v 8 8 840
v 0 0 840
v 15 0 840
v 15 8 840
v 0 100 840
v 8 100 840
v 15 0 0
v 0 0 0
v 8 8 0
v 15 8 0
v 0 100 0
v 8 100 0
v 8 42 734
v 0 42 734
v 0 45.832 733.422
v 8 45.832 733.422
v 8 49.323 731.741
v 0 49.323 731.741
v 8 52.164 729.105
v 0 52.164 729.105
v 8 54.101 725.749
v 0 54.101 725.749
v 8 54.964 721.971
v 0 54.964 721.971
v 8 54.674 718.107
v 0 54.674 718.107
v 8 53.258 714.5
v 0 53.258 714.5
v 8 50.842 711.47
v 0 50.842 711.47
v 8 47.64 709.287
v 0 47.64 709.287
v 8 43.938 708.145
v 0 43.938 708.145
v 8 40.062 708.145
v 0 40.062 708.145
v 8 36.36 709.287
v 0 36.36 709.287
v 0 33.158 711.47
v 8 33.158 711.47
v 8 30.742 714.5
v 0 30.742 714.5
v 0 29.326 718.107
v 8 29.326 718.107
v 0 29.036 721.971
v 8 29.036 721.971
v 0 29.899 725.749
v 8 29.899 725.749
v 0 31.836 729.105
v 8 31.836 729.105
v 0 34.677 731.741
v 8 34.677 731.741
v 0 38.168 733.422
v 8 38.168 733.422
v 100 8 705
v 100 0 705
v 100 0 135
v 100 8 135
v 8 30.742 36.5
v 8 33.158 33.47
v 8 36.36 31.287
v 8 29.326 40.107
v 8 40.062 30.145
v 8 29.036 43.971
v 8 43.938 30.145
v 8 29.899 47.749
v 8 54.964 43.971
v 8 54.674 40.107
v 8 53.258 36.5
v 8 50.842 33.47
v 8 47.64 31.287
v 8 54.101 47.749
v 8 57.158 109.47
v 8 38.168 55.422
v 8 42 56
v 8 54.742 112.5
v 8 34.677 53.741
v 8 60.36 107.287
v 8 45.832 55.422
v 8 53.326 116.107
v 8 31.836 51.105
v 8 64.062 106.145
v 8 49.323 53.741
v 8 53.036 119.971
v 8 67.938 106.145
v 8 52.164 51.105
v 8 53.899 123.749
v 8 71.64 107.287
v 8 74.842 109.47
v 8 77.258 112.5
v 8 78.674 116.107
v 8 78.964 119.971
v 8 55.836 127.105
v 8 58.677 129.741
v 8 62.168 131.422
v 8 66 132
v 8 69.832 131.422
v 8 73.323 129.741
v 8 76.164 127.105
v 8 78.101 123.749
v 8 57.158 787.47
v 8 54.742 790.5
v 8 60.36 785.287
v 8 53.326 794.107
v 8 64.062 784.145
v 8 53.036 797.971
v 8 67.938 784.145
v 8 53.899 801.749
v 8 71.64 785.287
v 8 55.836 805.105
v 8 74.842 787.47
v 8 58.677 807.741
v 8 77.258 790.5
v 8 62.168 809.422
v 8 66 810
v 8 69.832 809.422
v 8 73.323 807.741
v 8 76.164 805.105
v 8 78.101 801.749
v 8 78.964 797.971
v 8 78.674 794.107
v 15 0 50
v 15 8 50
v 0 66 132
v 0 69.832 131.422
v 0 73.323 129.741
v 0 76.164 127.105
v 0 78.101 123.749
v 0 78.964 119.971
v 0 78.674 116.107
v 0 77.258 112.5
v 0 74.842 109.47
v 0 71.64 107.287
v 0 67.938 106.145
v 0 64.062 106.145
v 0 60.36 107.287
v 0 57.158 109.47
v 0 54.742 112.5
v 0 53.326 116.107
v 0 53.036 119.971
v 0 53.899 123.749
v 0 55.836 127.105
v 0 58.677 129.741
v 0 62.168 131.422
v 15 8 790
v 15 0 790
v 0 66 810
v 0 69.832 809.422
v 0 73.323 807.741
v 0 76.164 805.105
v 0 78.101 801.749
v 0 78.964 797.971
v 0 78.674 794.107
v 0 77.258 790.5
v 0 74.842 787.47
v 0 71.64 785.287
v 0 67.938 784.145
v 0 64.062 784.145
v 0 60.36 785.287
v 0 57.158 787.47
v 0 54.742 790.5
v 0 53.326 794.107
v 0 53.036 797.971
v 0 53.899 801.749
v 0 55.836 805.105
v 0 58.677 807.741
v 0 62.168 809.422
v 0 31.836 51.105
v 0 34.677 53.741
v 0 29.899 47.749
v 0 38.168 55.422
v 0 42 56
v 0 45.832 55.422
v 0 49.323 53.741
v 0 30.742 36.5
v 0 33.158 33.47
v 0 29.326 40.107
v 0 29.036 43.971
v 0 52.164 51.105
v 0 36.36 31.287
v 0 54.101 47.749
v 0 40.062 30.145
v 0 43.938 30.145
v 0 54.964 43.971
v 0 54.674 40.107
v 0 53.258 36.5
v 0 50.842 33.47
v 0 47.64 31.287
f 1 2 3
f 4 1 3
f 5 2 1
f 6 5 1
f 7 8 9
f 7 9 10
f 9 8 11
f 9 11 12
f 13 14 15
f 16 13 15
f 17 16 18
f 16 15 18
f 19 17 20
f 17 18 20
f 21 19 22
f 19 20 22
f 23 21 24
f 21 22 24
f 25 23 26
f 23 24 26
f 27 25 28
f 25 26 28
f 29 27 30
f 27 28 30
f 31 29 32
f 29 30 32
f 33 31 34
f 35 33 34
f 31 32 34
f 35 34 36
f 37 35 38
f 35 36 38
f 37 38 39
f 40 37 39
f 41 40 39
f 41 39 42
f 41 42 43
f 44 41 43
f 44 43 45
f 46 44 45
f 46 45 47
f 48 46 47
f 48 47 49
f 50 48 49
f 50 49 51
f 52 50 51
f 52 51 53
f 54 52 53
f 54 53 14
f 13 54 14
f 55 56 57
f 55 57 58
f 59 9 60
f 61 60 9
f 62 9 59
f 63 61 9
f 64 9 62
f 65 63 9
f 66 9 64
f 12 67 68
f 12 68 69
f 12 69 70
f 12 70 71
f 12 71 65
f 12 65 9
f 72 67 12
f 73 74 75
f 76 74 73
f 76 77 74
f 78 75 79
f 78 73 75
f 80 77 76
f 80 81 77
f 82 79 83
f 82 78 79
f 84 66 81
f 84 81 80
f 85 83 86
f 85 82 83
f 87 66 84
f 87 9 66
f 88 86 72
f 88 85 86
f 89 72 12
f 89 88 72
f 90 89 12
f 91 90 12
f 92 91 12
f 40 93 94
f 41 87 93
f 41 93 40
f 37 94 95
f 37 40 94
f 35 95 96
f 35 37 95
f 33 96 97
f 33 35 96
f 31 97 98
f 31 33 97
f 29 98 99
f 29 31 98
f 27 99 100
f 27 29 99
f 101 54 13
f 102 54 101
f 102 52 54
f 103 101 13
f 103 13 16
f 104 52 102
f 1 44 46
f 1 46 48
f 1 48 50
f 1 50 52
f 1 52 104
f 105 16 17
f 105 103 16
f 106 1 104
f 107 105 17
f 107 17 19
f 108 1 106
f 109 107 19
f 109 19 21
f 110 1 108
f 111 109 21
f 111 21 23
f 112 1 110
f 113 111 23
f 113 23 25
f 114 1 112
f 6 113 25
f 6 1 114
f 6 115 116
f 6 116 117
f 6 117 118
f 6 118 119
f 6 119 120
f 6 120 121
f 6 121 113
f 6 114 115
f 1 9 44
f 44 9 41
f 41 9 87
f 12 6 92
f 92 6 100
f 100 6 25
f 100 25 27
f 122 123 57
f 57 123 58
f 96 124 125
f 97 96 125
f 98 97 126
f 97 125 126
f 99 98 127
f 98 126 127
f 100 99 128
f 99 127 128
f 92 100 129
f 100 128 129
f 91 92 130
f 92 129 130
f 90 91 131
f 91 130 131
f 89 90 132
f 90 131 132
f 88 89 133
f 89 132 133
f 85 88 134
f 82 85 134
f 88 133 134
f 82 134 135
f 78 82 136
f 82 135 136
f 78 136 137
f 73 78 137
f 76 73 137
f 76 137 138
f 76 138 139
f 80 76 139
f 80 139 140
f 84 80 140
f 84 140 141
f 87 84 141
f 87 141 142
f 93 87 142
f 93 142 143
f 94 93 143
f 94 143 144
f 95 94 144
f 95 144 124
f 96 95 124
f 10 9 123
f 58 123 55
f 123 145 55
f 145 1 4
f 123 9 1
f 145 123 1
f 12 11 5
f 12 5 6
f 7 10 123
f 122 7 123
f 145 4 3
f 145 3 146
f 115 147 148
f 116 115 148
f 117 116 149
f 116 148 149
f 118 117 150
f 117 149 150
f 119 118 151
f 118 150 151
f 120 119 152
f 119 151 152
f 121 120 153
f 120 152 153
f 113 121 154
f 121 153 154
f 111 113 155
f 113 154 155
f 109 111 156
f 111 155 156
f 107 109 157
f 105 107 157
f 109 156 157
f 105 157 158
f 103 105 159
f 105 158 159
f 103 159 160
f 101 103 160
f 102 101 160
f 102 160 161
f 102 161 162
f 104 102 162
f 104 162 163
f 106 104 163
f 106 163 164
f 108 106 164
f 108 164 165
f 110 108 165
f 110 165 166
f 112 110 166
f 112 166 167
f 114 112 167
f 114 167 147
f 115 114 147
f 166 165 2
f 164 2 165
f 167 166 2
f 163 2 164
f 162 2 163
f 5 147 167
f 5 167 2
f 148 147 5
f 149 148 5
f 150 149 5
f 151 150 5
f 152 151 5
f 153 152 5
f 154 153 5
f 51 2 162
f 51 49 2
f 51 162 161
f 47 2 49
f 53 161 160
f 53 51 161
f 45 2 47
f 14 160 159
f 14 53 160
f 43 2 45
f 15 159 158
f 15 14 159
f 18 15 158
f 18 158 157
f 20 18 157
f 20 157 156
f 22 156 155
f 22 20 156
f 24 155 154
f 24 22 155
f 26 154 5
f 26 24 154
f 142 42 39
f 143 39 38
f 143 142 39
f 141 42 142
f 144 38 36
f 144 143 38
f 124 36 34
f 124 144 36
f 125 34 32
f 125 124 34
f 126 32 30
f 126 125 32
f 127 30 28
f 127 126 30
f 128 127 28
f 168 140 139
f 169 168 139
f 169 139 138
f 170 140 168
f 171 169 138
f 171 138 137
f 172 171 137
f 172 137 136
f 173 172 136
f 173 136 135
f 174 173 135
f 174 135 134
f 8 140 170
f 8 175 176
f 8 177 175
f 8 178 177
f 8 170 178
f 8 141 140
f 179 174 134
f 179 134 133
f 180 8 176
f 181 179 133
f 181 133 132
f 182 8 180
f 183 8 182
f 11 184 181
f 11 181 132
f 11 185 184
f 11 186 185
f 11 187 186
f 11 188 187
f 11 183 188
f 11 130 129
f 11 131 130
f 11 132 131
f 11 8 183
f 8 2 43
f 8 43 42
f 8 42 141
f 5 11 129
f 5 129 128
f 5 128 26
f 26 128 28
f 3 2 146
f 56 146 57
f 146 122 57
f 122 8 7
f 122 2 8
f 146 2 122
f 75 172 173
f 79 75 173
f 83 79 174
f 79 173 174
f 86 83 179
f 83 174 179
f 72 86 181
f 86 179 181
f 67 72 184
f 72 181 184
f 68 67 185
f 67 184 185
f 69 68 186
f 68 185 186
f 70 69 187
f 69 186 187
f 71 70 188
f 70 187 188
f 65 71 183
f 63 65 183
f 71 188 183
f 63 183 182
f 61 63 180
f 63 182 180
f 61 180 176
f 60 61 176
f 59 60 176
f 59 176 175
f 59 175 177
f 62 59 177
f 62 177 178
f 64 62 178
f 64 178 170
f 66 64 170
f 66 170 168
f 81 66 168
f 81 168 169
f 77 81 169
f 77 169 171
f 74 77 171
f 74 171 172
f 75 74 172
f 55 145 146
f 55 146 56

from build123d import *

# Parameters (mm, degrees)
SKETCH_1_W          = 100
SKETCH_1_H          = 100
EXTRUDE_1_DEPTH     = 840
SKETCH_2_W          = 92
SKETCH_2_H          = 92
CUT_EXTRUDE_1_DEPTH = 852.821577562
SKETCH_3_R          = 13
CUT_EXTRUDE_2_DEPTH = 852.821577562
CUT_EXTRUDE_3_DEPTH = 851.919502656


with BuildPart() as part:
    # 草图1 → 凸台-拉伸1 (new body)
    with BuildSketch(Plane.XY):
        with Locations((50, 50)):
            Rectangle(SKETCH_1_W, SKETCH_1_H)
    extrude(amount=EXTRUDE_1_DEPTH)

    # 草图2 → 切除-拉伸1 (cut, through all)
    with BuildSketch(Plane.XY.offset(840)):
        with Locations((54, 54)):
            Rectangle(SKETCH_2_W, SKETCH_2_H)
    extrude(amount=-CUT_EXTRUDE_1_DEPTH, mode=Mode.SUBTRACT)

    # 草图3 → 切除-拉伸2 (cut, through all)
    with BuildSketch(Plane.ZY):
        with Locations((43, 42)):
            Circle(SKETCH_3_R)
        with Locations((119, 66)):
            Circle(SKETCH_3_R)
        with Locations((797, 66)):
            Circle(SKETCH_3_R)
        with Locations((721, 42)):
            Circle(SKETCH_3_R)
    extrude(amount=-CUT_EXTRUDE_2_DEPTH, mode=Mode.SUBTRACT)

    # 草图4 → 切除-拉伸3 (cut, through all)
    with BuildSketch(Plane(origin=(0, 8, 0), x_dir=(1, 0, 0), z_dir=(0, 1, 0))):
        Polygon((15, 0), (15, -50), (100, -135), (100, 0), align=None)
        Polygon((15, -840), (15, -790), (100, -705), (100, -840), align=None)
    extrude(amount=-CUT_EXTRUDE_3_DEPTH, mode=Mode.SUBTRACT)


solid = part.part
